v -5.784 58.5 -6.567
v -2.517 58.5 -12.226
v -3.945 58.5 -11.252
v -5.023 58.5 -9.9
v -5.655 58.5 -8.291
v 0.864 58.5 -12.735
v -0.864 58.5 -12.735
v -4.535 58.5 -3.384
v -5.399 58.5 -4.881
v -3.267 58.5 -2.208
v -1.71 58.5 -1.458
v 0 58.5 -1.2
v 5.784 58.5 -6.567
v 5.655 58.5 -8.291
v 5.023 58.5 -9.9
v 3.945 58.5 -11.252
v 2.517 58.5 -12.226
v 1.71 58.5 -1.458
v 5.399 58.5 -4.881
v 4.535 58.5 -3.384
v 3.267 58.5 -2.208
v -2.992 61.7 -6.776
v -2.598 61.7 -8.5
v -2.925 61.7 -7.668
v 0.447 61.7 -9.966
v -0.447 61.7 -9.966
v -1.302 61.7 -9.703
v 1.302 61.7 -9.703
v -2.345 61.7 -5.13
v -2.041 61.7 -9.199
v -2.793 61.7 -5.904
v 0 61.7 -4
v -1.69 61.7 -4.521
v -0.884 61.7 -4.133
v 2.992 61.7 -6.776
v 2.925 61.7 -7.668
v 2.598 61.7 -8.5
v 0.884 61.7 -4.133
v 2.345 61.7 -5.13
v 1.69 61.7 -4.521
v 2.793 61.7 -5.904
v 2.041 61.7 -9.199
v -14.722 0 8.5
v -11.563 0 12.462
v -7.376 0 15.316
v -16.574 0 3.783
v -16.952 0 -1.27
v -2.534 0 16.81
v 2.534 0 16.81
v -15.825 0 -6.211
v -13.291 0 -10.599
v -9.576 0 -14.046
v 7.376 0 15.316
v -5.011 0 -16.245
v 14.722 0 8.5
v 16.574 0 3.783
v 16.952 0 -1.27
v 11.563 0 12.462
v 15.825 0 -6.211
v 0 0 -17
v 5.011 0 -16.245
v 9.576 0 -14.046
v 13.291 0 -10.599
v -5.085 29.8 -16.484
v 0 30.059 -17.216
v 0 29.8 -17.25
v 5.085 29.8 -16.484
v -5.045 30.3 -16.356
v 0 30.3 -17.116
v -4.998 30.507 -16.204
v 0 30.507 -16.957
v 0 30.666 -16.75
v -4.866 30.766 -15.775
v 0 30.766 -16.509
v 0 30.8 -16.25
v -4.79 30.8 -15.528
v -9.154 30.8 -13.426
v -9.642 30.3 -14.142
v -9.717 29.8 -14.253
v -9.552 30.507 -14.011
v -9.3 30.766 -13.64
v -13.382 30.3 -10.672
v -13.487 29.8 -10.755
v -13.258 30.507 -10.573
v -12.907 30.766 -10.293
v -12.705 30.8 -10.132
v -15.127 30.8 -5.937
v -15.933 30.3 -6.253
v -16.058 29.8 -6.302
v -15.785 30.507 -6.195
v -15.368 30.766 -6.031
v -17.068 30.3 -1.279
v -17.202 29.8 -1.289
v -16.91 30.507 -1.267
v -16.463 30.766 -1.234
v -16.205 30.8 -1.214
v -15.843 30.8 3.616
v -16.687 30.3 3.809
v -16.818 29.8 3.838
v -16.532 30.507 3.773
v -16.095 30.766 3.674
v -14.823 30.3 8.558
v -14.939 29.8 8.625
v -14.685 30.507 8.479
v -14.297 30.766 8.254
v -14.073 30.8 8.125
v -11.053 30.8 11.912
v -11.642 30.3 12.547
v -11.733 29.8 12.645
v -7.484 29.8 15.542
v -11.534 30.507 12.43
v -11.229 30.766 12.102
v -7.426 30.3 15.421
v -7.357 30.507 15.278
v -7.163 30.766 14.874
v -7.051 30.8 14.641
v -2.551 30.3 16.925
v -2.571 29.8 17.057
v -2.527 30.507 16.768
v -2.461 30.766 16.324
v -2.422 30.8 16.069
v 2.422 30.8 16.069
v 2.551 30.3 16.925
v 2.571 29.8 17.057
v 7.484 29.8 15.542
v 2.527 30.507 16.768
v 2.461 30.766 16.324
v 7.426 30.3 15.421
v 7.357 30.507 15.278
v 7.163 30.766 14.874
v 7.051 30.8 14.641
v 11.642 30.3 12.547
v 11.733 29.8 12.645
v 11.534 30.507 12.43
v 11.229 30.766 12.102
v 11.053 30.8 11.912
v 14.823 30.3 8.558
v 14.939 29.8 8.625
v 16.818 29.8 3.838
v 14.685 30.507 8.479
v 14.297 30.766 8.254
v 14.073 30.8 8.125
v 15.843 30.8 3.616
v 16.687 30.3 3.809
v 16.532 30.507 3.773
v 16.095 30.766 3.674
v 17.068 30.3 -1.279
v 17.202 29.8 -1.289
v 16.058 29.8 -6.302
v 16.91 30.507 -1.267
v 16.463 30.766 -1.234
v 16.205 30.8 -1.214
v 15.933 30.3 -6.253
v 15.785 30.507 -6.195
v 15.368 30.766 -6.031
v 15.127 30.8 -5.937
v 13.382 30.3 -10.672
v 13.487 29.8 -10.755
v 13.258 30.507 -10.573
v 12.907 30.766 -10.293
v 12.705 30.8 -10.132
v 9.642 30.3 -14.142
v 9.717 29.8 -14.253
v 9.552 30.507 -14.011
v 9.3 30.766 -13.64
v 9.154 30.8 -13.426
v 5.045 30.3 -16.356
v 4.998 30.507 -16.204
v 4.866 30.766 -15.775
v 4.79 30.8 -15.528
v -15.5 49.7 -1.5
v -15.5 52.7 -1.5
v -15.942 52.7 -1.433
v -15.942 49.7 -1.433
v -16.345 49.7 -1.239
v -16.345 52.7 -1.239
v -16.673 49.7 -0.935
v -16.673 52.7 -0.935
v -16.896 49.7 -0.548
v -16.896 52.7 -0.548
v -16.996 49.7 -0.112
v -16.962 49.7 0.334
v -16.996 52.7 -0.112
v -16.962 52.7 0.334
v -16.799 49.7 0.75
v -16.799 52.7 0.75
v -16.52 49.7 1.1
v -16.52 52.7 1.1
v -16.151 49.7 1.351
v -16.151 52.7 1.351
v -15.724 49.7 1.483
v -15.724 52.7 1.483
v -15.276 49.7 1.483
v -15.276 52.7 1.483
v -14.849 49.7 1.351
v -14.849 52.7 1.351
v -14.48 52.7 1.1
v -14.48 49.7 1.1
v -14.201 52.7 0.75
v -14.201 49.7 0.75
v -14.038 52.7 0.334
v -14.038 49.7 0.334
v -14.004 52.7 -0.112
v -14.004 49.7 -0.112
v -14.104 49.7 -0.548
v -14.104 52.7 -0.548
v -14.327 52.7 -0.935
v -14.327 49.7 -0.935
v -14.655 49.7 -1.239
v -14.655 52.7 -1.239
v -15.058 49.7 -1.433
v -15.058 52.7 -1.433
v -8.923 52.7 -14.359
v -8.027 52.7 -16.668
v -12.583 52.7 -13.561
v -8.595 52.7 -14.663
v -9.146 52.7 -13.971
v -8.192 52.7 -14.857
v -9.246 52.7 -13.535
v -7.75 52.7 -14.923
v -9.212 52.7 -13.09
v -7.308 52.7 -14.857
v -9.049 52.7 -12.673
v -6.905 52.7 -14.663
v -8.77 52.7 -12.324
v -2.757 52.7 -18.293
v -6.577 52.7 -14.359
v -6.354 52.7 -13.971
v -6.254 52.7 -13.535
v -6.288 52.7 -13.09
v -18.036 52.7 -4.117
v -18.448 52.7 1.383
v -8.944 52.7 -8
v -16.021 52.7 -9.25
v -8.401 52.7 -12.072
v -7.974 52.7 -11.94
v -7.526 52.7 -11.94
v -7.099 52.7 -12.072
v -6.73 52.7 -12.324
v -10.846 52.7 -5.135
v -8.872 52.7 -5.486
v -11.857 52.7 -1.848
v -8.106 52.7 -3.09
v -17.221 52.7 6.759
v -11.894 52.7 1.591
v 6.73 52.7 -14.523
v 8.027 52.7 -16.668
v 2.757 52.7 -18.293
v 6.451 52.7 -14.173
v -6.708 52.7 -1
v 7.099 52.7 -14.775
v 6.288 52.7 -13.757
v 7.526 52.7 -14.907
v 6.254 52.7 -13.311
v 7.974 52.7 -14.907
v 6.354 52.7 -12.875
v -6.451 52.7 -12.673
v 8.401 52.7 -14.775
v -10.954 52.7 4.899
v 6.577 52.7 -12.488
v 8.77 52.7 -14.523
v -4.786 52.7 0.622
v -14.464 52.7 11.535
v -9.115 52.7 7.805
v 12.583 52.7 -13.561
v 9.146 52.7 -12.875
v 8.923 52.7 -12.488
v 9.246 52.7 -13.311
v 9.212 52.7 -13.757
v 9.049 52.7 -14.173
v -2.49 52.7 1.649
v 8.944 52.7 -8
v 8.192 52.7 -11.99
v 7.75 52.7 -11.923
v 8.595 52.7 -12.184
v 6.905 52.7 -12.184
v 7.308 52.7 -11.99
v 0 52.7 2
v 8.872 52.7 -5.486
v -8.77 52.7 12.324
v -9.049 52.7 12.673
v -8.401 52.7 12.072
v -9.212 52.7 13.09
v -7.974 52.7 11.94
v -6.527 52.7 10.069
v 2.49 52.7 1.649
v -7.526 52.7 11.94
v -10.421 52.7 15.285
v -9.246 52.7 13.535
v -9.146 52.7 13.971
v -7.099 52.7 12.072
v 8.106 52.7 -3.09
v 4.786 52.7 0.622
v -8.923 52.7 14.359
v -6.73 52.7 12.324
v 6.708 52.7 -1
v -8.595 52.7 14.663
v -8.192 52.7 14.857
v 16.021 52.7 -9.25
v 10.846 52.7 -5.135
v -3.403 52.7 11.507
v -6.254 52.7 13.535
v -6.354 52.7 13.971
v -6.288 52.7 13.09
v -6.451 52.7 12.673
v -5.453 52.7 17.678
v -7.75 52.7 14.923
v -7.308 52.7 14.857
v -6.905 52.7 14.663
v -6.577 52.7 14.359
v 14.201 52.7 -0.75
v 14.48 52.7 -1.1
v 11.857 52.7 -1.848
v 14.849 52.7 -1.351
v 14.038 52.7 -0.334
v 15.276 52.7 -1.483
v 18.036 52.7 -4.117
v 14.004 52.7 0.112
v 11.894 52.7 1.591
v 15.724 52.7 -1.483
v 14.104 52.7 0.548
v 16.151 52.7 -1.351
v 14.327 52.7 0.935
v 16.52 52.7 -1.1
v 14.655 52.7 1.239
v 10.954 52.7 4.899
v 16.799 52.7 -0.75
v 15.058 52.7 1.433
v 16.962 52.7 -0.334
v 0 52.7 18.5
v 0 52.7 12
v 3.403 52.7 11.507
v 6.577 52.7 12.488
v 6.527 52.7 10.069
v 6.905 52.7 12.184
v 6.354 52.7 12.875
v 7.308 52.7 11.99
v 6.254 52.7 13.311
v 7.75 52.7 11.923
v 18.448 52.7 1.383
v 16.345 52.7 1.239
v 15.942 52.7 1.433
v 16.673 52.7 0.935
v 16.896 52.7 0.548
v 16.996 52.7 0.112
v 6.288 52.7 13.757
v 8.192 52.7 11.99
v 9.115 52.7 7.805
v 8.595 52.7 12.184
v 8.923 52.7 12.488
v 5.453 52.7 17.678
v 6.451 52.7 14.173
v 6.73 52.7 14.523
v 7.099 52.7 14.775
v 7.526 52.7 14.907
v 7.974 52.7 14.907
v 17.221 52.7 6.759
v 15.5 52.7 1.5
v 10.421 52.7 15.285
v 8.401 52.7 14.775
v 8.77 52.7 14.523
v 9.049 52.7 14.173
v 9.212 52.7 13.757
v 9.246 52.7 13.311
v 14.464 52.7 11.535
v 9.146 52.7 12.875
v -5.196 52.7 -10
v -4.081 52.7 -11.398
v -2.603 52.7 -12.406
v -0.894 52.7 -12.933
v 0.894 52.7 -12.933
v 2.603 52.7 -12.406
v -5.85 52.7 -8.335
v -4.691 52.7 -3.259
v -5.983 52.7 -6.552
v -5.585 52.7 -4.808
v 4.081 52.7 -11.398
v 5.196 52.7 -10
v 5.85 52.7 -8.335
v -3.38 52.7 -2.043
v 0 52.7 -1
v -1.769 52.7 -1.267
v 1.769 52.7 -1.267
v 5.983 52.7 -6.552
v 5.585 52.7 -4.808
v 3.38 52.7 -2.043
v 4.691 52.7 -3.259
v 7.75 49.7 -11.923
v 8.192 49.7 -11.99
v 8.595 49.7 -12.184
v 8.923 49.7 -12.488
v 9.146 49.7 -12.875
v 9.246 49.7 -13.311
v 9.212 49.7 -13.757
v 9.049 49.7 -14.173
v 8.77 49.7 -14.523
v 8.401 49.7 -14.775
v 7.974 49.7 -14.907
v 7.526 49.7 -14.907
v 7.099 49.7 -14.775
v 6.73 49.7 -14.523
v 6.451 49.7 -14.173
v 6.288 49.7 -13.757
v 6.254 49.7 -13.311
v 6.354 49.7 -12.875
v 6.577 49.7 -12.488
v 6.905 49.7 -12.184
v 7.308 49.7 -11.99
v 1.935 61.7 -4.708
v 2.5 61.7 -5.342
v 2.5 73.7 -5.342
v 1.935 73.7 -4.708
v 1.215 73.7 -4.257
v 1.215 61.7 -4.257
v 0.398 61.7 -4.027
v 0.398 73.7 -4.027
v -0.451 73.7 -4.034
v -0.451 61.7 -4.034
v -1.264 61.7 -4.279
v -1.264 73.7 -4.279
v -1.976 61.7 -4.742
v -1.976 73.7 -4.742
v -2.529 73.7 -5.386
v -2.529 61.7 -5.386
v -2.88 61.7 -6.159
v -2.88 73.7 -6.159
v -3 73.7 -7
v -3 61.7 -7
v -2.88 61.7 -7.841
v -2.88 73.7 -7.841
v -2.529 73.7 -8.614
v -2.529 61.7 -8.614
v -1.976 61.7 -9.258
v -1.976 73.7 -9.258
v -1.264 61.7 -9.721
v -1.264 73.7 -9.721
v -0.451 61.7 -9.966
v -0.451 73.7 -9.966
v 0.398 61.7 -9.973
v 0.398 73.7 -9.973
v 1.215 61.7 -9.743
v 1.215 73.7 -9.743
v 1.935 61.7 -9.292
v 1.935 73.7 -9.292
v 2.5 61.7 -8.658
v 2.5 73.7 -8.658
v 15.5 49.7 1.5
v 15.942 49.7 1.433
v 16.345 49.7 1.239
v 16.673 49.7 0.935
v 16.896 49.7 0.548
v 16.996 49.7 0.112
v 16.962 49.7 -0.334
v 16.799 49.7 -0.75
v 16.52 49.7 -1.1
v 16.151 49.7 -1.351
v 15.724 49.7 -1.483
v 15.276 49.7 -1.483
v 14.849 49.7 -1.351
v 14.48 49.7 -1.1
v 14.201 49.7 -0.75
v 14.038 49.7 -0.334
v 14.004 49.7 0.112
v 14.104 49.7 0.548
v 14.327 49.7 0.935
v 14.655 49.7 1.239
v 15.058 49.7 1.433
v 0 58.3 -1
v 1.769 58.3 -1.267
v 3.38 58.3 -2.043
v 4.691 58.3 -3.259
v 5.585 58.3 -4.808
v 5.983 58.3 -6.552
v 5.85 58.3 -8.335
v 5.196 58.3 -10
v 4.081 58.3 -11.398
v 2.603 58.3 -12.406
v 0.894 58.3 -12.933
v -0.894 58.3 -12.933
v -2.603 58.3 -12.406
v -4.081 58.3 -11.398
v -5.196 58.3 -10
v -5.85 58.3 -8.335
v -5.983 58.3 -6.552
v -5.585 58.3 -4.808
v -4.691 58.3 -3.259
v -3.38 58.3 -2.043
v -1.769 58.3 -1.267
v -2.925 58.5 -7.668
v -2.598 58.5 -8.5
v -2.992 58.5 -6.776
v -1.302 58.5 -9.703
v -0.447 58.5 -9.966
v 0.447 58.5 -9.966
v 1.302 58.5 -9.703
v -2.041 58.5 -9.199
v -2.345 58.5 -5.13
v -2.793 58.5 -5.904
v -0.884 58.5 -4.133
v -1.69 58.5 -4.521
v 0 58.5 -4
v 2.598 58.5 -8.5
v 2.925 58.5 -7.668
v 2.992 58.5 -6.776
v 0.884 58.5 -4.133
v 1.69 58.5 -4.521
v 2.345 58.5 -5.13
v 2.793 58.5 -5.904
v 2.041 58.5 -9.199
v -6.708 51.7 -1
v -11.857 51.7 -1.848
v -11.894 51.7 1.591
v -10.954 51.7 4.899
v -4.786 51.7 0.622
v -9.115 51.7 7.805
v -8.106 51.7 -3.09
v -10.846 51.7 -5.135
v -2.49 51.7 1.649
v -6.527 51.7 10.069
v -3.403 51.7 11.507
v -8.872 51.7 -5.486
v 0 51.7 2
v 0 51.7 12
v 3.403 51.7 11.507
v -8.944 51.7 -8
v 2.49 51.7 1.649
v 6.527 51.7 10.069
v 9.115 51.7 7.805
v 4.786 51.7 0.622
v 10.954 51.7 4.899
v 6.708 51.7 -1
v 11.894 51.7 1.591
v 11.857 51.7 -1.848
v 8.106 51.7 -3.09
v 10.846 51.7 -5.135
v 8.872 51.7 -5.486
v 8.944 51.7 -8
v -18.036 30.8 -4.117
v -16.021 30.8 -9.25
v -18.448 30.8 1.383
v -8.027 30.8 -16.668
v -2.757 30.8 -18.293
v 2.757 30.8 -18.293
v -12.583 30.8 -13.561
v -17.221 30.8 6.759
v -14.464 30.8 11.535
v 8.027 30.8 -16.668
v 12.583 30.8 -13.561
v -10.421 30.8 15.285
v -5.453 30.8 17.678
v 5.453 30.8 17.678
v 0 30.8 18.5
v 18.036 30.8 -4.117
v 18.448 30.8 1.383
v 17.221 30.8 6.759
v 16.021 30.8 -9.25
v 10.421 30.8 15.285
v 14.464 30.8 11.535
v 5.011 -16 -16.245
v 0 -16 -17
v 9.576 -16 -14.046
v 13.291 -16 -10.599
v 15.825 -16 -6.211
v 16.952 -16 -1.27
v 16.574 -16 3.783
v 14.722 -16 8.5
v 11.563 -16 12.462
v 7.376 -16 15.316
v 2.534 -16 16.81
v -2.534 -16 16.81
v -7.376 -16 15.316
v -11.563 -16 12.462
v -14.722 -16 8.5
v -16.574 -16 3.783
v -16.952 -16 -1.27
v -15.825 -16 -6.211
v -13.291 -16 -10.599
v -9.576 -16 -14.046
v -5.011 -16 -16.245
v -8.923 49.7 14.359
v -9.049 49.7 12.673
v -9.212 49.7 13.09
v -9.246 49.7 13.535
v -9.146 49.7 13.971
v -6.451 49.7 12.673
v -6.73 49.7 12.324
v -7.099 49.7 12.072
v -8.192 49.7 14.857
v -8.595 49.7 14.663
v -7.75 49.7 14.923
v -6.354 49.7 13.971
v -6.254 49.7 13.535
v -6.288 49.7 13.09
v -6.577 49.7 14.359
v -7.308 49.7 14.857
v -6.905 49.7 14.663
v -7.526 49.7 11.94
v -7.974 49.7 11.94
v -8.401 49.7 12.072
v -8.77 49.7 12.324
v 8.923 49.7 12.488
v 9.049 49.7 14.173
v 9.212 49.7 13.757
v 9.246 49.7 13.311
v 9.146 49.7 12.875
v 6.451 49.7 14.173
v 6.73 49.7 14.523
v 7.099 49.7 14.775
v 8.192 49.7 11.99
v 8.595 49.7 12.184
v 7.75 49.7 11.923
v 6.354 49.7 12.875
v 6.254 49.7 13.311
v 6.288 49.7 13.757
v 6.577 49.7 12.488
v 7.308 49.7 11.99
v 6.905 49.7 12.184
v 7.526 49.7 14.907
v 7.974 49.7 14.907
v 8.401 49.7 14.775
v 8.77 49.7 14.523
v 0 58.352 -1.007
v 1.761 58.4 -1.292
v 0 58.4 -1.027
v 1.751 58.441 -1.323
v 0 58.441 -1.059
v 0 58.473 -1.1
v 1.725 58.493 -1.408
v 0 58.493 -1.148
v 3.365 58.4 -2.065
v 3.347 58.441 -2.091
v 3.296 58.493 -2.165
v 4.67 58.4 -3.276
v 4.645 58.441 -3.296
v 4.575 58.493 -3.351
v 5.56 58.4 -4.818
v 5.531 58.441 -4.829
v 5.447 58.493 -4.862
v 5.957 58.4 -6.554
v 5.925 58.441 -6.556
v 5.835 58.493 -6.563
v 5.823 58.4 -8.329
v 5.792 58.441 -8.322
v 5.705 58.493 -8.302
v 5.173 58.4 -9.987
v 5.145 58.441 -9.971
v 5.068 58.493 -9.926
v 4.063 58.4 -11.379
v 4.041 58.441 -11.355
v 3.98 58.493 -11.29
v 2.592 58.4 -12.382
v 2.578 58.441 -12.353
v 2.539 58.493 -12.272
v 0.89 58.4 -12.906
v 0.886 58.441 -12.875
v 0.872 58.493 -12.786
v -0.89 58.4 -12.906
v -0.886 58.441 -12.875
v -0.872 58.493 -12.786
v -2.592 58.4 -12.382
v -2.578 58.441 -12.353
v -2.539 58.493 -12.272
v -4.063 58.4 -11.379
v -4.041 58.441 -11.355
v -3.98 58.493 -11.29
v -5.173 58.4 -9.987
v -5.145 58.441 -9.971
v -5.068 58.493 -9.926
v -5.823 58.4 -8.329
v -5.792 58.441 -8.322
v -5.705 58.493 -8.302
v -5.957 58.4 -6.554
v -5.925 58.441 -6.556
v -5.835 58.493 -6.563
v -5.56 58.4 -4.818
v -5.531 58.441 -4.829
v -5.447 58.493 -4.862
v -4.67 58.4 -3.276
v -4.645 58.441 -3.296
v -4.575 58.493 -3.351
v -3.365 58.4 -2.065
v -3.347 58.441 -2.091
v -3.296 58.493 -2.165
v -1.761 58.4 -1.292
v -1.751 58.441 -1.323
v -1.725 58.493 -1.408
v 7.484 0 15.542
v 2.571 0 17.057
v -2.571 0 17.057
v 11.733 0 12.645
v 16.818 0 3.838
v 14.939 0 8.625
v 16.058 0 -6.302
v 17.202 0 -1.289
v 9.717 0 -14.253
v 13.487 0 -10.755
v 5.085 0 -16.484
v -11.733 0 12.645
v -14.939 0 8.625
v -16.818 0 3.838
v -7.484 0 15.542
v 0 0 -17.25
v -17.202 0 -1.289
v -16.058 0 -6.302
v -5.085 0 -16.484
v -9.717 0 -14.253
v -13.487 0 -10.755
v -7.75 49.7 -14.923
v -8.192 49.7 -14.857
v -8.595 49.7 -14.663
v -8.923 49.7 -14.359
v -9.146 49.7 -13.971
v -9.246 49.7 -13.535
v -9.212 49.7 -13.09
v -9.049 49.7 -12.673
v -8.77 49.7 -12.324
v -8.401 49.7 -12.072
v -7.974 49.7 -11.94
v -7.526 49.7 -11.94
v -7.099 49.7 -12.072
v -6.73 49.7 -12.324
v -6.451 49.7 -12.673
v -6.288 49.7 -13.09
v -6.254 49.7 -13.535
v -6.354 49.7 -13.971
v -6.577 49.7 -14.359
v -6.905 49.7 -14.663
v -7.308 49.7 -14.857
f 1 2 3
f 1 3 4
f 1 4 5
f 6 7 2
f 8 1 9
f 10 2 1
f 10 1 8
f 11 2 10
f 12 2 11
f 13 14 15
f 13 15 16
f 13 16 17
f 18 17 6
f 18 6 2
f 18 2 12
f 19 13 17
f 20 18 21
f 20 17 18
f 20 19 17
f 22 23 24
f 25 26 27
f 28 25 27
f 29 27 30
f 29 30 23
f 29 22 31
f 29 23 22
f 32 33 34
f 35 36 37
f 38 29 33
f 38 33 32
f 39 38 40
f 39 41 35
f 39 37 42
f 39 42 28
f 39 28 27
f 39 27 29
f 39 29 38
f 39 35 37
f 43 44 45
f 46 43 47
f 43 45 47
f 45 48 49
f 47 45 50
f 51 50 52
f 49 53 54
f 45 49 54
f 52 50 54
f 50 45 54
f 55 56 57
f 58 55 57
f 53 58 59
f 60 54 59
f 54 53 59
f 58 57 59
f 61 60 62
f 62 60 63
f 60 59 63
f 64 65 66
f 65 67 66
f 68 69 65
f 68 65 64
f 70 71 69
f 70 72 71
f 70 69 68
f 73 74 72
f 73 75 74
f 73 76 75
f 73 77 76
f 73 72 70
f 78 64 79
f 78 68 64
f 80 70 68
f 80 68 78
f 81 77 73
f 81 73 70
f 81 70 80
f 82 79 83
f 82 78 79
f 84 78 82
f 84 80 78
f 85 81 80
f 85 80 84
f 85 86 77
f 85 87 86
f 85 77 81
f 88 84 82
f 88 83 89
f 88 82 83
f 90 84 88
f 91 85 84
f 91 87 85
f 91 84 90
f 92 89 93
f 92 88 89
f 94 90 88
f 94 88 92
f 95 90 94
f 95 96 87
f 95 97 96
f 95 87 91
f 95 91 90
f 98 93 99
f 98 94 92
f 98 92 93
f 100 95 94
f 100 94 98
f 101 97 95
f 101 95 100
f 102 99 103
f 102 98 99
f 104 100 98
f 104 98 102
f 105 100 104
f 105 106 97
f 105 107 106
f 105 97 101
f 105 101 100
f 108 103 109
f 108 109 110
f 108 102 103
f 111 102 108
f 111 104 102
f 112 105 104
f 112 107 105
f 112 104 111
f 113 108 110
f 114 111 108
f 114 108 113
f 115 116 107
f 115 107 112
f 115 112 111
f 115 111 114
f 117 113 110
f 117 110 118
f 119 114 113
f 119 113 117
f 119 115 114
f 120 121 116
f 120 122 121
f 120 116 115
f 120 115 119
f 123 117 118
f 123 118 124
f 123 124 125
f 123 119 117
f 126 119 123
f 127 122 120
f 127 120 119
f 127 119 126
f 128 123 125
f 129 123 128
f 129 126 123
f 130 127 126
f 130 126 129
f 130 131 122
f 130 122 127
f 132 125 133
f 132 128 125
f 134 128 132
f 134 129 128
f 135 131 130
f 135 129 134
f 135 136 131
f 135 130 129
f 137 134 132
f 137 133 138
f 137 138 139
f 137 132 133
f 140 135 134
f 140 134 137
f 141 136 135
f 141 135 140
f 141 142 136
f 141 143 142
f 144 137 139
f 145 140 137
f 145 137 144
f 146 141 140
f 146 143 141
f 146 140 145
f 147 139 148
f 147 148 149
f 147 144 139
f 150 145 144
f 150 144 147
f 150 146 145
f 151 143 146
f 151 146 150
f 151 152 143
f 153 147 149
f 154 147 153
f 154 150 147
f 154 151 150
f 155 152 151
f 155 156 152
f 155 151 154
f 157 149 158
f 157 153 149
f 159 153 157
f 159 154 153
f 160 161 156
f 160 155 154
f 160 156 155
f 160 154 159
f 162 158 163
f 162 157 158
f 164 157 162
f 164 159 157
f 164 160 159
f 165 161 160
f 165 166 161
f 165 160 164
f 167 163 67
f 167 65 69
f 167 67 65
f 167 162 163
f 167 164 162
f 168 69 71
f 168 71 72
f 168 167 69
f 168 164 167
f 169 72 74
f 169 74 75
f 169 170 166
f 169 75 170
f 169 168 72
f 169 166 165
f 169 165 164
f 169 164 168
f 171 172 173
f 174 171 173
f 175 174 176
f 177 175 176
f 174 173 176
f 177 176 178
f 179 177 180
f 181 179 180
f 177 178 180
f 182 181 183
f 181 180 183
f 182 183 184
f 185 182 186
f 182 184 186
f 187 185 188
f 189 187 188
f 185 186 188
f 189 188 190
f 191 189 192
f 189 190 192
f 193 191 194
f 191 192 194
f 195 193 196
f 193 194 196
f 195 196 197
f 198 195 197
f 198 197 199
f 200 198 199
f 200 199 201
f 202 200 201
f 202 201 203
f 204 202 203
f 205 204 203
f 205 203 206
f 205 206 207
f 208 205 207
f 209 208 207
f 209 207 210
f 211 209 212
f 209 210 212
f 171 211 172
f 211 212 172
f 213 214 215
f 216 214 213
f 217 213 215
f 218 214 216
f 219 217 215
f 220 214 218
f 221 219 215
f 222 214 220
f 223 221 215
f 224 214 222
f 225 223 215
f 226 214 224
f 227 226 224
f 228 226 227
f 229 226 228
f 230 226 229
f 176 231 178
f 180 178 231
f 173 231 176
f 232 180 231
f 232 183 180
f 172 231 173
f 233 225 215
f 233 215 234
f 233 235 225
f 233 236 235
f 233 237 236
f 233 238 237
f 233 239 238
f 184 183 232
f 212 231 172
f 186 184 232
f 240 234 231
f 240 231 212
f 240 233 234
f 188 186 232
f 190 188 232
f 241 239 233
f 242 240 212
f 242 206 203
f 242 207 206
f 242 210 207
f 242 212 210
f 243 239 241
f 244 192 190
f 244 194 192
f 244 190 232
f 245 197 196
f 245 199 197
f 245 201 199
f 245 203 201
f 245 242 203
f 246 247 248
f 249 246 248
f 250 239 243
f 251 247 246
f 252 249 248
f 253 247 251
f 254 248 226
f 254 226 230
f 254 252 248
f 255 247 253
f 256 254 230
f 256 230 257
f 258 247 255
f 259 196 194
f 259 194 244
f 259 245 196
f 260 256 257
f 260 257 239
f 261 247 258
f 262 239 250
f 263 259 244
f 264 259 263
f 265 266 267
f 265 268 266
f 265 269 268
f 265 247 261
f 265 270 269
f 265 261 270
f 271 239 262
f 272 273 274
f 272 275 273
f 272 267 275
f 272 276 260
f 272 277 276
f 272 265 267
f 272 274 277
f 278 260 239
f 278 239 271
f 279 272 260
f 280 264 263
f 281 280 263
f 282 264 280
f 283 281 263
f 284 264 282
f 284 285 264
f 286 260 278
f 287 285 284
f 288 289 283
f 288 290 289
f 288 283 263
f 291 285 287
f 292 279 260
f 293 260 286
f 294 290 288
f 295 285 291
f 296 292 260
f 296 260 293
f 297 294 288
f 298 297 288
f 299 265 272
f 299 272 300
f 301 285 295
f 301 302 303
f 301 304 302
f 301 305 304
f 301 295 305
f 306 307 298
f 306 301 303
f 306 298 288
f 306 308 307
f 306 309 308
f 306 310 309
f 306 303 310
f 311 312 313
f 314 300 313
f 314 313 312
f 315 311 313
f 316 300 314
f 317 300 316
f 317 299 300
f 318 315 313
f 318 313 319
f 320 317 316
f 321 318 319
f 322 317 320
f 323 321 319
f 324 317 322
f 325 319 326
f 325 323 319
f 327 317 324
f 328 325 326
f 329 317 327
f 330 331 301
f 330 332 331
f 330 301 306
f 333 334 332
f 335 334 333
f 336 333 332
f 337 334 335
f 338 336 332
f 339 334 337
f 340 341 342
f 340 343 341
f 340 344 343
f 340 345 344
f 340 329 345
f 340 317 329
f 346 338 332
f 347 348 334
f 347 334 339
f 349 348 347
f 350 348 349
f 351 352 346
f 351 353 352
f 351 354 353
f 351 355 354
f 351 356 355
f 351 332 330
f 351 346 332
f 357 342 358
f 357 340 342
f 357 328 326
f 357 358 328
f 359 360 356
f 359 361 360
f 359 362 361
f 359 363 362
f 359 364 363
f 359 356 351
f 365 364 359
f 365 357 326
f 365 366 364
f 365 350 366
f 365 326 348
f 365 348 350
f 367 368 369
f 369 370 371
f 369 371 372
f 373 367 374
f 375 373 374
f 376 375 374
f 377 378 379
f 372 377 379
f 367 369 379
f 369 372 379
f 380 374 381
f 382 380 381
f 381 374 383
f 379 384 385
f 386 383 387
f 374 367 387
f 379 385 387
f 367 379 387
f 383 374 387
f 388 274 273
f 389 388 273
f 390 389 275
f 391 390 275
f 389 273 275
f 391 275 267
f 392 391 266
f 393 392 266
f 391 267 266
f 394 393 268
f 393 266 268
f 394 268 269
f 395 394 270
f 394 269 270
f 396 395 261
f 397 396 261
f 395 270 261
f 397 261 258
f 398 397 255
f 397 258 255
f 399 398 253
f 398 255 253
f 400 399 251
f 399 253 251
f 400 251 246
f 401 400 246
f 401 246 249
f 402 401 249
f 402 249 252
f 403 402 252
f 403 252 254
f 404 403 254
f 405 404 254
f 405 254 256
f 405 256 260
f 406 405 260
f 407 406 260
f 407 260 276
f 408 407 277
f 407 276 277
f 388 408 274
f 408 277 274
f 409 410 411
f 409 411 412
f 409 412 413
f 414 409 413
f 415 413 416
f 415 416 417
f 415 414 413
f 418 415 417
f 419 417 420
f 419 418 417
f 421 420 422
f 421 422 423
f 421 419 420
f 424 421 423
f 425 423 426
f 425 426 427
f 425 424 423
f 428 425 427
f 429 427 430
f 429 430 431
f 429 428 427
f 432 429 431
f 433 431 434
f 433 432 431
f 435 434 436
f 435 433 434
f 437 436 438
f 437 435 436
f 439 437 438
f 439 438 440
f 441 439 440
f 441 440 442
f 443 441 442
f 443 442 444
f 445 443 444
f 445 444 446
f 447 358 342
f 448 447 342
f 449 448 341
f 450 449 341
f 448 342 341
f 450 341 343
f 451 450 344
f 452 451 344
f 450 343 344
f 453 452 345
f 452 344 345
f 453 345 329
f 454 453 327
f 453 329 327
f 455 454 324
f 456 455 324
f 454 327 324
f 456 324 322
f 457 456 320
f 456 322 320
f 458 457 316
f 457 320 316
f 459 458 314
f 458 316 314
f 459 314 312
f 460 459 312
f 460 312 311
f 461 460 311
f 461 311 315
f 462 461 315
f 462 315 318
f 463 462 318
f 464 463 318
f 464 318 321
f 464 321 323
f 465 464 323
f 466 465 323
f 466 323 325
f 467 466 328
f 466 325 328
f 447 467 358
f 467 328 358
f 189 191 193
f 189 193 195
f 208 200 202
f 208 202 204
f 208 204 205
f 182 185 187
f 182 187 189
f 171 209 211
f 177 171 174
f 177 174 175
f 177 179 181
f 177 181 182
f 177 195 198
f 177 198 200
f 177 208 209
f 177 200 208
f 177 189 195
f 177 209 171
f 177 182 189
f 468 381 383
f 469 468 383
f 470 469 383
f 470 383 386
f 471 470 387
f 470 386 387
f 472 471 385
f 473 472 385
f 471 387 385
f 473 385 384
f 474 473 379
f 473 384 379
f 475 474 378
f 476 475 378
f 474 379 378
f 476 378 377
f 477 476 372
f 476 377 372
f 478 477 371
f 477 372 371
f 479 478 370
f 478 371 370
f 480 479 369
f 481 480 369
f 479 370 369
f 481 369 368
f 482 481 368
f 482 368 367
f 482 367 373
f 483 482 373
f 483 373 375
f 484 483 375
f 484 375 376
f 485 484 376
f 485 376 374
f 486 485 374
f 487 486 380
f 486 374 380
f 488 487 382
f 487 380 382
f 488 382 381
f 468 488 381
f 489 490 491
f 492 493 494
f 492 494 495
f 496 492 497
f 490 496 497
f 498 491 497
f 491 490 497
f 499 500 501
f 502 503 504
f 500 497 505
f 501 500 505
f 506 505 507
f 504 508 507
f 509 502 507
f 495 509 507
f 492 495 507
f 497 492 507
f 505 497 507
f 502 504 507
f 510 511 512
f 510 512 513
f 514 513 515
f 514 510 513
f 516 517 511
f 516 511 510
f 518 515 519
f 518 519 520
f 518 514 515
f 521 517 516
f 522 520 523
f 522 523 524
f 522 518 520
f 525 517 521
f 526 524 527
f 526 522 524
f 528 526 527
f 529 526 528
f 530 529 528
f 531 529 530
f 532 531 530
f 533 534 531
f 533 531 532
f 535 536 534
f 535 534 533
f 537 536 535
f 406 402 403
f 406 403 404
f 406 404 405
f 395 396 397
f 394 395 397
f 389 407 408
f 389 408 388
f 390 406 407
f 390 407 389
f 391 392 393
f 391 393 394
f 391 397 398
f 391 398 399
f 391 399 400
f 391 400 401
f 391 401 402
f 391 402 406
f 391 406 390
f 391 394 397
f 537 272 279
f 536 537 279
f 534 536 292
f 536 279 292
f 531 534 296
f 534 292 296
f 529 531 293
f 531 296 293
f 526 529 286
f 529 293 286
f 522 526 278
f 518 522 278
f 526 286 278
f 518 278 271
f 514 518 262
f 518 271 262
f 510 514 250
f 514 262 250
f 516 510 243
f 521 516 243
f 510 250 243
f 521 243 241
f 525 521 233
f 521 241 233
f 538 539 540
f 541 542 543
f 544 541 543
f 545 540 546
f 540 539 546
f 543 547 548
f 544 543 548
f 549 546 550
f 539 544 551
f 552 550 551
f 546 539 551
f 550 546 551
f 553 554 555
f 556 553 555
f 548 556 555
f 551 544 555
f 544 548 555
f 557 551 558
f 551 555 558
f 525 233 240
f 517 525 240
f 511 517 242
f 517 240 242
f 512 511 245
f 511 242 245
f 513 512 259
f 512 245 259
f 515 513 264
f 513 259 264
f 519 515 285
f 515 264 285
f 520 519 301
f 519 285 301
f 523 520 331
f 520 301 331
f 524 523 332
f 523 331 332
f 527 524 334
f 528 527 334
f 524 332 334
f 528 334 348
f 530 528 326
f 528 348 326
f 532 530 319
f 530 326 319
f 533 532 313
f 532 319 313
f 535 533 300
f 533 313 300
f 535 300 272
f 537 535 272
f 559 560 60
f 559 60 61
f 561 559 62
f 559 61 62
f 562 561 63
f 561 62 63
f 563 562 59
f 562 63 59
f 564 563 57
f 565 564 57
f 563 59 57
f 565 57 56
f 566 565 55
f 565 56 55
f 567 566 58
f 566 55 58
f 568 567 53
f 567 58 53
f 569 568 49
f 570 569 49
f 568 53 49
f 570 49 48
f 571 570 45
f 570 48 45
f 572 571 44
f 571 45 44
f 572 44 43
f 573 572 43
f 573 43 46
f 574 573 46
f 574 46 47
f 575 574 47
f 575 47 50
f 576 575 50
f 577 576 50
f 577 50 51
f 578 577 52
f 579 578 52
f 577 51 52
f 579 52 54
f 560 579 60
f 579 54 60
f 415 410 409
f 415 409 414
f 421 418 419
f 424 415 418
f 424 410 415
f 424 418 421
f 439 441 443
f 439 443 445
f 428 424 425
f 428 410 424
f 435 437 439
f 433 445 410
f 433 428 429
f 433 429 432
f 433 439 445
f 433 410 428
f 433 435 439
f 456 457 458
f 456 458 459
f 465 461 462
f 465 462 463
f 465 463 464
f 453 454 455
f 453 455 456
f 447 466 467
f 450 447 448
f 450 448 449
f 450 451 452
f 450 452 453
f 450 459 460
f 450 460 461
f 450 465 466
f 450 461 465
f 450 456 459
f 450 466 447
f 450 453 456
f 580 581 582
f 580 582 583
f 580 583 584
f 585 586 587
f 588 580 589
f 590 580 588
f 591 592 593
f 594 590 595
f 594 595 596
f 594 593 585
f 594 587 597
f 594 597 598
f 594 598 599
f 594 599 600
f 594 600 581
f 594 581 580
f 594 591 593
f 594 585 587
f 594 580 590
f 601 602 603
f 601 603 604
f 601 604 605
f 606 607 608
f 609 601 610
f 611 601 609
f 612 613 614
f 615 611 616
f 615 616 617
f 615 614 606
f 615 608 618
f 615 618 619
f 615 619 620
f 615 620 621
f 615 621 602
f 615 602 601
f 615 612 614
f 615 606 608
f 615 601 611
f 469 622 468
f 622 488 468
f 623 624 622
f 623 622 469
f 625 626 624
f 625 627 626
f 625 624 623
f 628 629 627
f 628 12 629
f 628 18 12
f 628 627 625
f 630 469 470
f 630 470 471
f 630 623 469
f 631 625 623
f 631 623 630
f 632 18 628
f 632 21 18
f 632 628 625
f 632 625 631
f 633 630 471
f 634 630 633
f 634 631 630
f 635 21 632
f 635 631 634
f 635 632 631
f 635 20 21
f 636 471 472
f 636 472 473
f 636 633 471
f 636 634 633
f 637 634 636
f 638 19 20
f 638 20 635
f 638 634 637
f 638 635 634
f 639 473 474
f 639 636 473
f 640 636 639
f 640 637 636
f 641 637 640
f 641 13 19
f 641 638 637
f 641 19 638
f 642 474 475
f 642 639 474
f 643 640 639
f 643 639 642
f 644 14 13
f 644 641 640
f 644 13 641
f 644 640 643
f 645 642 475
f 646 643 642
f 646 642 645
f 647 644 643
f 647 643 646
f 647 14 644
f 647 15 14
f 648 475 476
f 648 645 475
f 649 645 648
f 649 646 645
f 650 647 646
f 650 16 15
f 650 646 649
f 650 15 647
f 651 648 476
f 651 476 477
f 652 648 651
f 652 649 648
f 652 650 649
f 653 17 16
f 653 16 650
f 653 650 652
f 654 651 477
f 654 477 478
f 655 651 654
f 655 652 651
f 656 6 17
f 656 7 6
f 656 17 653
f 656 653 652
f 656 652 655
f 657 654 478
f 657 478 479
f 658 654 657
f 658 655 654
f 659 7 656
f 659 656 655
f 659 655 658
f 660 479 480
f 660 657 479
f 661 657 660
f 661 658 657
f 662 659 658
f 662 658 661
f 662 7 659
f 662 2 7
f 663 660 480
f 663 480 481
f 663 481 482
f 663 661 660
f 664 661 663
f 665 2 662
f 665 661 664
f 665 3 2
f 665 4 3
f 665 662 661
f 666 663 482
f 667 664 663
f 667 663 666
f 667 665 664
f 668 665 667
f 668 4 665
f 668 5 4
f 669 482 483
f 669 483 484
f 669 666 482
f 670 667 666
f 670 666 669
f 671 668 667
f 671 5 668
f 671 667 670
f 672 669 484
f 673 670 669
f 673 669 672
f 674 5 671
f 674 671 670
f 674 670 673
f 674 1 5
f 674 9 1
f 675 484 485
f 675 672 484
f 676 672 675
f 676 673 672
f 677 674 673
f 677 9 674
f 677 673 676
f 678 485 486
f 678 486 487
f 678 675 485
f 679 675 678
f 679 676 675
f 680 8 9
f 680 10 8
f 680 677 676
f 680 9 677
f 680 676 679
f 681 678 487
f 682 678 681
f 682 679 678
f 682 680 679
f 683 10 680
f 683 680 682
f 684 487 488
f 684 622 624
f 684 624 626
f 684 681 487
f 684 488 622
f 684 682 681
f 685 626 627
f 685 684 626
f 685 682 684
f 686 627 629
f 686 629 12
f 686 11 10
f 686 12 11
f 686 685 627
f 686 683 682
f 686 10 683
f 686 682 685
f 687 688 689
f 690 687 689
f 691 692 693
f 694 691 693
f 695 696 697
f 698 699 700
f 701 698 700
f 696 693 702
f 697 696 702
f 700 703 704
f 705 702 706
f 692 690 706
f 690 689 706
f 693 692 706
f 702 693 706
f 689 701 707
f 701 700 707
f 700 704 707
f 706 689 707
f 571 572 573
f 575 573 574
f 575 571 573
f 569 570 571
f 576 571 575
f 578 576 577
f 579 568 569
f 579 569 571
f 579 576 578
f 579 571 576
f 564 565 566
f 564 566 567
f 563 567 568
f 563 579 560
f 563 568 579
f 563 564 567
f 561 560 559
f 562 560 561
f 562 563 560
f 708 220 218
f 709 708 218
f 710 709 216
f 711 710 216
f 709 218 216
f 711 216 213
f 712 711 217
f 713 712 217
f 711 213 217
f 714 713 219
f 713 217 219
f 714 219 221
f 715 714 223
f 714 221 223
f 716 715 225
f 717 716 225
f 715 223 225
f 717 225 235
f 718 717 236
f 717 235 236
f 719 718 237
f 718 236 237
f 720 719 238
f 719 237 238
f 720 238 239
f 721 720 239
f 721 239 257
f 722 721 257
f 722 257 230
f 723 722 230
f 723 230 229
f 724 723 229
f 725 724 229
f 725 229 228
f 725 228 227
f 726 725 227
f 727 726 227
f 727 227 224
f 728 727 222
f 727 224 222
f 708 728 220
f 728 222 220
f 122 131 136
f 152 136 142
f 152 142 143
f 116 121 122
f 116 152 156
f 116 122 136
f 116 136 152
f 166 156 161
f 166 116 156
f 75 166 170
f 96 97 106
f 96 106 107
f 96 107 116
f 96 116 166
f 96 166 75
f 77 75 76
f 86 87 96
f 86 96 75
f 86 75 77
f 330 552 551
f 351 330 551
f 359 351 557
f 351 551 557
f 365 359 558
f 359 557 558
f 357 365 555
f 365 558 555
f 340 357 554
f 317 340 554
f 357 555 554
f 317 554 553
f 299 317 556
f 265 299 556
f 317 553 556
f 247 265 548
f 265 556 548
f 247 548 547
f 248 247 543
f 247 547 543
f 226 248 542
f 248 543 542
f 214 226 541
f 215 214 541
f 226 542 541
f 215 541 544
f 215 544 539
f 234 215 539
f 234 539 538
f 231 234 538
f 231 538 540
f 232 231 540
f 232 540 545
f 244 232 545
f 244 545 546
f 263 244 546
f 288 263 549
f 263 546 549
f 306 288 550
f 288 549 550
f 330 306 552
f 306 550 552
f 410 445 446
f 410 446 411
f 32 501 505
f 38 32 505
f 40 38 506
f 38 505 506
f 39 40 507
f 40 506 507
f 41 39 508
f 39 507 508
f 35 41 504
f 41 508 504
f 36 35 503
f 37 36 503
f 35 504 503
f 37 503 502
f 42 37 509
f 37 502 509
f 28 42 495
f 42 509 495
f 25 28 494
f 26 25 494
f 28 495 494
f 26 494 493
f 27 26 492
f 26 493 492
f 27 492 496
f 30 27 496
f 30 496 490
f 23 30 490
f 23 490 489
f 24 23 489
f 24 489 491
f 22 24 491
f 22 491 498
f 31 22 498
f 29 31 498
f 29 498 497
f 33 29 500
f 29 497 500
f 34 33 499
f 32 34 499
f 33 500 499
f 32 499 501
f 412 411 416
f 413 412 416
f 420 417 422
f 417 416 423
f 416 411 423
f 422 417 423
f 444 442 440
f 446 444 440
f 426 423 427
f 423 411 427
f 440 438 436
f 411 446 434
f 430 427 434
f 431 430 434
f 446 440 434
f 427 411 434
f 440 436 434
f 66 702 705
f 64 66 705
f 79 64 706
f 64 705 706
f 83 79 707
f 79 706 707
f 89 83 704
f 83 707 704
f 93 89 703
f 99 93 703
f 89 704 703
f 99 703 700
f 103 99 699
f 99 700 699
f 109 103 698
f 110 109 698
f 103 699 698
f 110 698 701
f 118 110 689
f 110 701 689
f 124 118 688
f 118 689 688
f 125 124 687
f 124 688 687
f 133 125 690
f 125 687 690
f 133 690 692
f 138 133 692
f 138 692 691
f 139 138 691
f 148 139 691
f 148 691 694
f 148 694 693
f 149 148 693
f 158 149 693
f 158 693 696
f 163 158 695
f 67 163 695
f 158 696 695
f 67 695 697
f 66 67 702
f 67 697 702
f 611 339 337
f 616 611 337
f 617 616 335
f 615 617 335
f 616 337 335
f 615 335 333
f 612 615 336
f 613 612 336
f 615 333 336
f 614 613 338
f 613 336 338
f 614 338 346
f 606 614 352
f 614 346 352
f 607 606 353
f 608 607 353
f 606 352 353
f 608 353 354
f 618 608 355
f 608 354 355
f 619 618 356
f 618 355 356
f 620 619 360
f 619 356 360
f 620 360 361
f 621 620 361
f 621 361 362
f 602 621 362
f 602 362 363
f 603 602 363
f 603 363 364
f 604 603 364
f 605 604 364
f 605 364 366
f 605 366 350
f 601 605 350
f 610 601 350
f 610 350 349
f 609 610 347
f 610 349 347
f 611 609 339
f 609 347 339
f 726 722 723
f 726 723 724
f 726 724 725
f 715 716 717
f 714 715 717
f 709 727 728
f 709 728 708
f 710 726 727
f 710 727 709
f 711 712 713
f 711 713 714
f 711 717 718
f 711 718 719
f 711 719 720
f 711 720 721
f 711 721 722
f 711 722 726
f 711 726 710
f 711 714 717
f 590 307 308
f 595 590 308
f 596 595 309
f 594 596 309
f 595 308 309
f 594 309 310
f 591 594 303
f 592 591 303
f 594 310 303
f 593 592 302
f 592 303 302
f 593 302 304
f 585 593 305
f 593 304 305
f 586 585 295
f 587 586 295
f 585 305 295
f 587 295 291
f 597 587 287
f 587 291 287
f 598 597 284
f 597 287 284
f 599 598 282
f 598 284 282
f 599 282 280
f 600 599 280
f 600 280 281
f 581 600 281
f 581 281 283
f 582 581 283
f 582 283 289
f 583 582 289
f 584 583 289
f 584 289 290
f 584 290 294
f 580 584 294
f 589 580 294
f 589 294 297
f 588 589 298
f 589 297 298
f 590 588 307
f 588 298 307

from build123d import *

# Parameters (mm, degrees)
CROQUIS1_R              = 17.25
SALIENTE_EXTRUIR1_DEPTH = 30.8
REDONDEO1_R             = 1
CROQUIS2_R              = 18.5
SALIENTE_EXTRUIR2_DEPTH = 21.9
CROQUIS3_R              = 6
SALIENTE_EXTRUIR3_DEPTH = 5.8
REDONDEO2_R             = 0.2
CROQUIS4_R              = 3
SALIENTE_EXTRUIR4_DEPTH = 3.2
SALIENTE_EXTRUIR5_DEPTH = 12
CROQUIS6_R              = 1.5
CORTAR_EXTRUIR1_DEPTH   = 3
CROQUIS7_R              = 17
SALIENTE_EXTRUIR6_DEPTH = 16
CORTAR_EXTRUIR2_DEPTH   = 1


with BuildPart() as part:
    # Croquis1 → Saliente-Extruir1 (new body)
    with BuildSketch(Plane(origin=(0, 0, 0), x_dir=(1, 0, 0), z_dir=(0, 1, 0))):
        with Locations(Location((0, 0, 0), (0, 0, 90))):
            Circle(CROQUIS1_R)
    extrude(amount=SALIENTE_EXTRUIR1_DEPTH)

    # Redondeo1
    redondeo1_edges = [part.edges().sort_by_distance(p)[0] for p in [
        (0, 30.8, 17.25),
    ]]
    fillet(redondeo1_edges, radius=REDONDEO1_R)


with BuildPart() as body_2:
    # Croquis2 → Saliente-Extruir2 (new body)
    with BuildSketch(Plane(origin=(0, 30.8, 0), x_dir=(1, 0, 0), z_dir=(0, 1, 0))):
        with Locations(Location((0, 0, 0), (0, 0, 270))):
            Circle(CROQUIS2_R)
    extrude(amount=SALIENTE_EXTRUIR2_DEPTH)

    # Croquis6 → Cortar-Extruir1 (cut)
    with BuildSketch(Plane(origin=(0, 52.7, 0), x_dir=(1, 0, 0), z_dir=(0, 1, 0))):
        with Locations(Location((15.5, 0, 0), (0, 0, 270))):
            Circle(CROQUIS6_R)
        with Locations(Location((7.75, 13.423393759, 0), (0, 0, 270))):
            Circle(CROQUIS6_R)
        with Locations(Location((7.75, -13.423393759, 0), (0, 0, 90))):
            Circle(CROQUIS6_R)
        with Locations(Location((-7.75, -13.423393759, 0), (0, 0, 270))):
            Circle(CROQUIS6_R)
        with Locations(Location((-15.5, 0, 0), (0, 0, 90))):
            Circle(CROQUIS6_R)
        with Locations(Location((-7.75, 13.423393759, 0), (0, 0, 90))):
            Circle(CROQUIS6_R)
    extrude(amount=-CORTAR_EXTRUIR1_DEPTH, mode=Mode.SUBTRACT)

    # Croquis8 → Cortar-Extruir2 (cut)
    with BuildSketch(Plane(origin=(0, 52.7, 0), x_dir=(1, 0, 0), z_dir=(0, 1, 0))):
        with BuildLine():
            ThreePointArc((-8.94427191, 8), (0, -12), (8.94427191, 8))
            ThreePointArc((8.94427191, 8), (0, -2), (-8.94427191, 8))
        make_face()
    extrude(amount=-CORTAR_EXTRUIR2_DEPTH, mode=Mode.SUBTRACT)


with BuildPart() as body_3:
    # Croquis3 → Saliente-Extruir3 (new body)
    with BuildSketch(Plane(origin=(0, 52.7, 0), x_dir=(1, 0, 0), z_dir=(0, 1, 0))):
        with Locations(Location((0, 7, 0), (0, 0, 270))):
            Circle(CROQUIS3_R)
    extrude(amount=SALIENTE_EXTRUIR3_DEPTH)

    # Redondeo2
    redondeo2_edges = [body_3.edges().sort_by_distance(p)[0] for p in [
        (0, 58.5, -13),
    ]]
    fillet(redondeo2_edges, radius=REDONDEO2_R)


with BuildPart() as body_4:
    # Croquis4 → Saliente-Extruir4 (new body)
    with BuildSketch(Plane(origin=(0, 58.5, 0), x_dir=(1, 0, 0), z_dir=(0, 1, 0))):
        with Locations(Location((0, 7, 0), (0, 0, 270))):
            Circle(CROQUIS4_R)
    extrude(amount=SALIENTE_EXTRUIR4_DEPTH)


with BuildPart() as body_5:
    # Croquis5 → Saliente-Extruir5 (new body)
    with BuildSketch(Plane(origin=(0, 61.7, 0), x_dir=(1, 0, 0), z_dir=(0, 1, 0))):
        with BuildLine():
            Line((2.5, 8.658312395), (2.5, 5.341687605))
            ThreePointArc((2.5, 5.341687605), (-3, 7), (2.5, 8.658312395))
        make_face()
    extrude(amount=SALIENTE_EXTRUIR5_DEPTH)


with BuildPart() as body_6:
    # Croquis7 → Saliente-Extruir6 (new body)
    with BuildSketch(Plane.XZ):
        with Locations(Location((0, 0, 0), (0, 0, 270))):
            Circle(CROQUIS7_R)
    extrude(amount=SALIENTE_EXTRUIR6_DEPTH)


solid = Compound([part.part, body_2.part, body_3.part, body_4.part, body_5.part, body_6.part])
